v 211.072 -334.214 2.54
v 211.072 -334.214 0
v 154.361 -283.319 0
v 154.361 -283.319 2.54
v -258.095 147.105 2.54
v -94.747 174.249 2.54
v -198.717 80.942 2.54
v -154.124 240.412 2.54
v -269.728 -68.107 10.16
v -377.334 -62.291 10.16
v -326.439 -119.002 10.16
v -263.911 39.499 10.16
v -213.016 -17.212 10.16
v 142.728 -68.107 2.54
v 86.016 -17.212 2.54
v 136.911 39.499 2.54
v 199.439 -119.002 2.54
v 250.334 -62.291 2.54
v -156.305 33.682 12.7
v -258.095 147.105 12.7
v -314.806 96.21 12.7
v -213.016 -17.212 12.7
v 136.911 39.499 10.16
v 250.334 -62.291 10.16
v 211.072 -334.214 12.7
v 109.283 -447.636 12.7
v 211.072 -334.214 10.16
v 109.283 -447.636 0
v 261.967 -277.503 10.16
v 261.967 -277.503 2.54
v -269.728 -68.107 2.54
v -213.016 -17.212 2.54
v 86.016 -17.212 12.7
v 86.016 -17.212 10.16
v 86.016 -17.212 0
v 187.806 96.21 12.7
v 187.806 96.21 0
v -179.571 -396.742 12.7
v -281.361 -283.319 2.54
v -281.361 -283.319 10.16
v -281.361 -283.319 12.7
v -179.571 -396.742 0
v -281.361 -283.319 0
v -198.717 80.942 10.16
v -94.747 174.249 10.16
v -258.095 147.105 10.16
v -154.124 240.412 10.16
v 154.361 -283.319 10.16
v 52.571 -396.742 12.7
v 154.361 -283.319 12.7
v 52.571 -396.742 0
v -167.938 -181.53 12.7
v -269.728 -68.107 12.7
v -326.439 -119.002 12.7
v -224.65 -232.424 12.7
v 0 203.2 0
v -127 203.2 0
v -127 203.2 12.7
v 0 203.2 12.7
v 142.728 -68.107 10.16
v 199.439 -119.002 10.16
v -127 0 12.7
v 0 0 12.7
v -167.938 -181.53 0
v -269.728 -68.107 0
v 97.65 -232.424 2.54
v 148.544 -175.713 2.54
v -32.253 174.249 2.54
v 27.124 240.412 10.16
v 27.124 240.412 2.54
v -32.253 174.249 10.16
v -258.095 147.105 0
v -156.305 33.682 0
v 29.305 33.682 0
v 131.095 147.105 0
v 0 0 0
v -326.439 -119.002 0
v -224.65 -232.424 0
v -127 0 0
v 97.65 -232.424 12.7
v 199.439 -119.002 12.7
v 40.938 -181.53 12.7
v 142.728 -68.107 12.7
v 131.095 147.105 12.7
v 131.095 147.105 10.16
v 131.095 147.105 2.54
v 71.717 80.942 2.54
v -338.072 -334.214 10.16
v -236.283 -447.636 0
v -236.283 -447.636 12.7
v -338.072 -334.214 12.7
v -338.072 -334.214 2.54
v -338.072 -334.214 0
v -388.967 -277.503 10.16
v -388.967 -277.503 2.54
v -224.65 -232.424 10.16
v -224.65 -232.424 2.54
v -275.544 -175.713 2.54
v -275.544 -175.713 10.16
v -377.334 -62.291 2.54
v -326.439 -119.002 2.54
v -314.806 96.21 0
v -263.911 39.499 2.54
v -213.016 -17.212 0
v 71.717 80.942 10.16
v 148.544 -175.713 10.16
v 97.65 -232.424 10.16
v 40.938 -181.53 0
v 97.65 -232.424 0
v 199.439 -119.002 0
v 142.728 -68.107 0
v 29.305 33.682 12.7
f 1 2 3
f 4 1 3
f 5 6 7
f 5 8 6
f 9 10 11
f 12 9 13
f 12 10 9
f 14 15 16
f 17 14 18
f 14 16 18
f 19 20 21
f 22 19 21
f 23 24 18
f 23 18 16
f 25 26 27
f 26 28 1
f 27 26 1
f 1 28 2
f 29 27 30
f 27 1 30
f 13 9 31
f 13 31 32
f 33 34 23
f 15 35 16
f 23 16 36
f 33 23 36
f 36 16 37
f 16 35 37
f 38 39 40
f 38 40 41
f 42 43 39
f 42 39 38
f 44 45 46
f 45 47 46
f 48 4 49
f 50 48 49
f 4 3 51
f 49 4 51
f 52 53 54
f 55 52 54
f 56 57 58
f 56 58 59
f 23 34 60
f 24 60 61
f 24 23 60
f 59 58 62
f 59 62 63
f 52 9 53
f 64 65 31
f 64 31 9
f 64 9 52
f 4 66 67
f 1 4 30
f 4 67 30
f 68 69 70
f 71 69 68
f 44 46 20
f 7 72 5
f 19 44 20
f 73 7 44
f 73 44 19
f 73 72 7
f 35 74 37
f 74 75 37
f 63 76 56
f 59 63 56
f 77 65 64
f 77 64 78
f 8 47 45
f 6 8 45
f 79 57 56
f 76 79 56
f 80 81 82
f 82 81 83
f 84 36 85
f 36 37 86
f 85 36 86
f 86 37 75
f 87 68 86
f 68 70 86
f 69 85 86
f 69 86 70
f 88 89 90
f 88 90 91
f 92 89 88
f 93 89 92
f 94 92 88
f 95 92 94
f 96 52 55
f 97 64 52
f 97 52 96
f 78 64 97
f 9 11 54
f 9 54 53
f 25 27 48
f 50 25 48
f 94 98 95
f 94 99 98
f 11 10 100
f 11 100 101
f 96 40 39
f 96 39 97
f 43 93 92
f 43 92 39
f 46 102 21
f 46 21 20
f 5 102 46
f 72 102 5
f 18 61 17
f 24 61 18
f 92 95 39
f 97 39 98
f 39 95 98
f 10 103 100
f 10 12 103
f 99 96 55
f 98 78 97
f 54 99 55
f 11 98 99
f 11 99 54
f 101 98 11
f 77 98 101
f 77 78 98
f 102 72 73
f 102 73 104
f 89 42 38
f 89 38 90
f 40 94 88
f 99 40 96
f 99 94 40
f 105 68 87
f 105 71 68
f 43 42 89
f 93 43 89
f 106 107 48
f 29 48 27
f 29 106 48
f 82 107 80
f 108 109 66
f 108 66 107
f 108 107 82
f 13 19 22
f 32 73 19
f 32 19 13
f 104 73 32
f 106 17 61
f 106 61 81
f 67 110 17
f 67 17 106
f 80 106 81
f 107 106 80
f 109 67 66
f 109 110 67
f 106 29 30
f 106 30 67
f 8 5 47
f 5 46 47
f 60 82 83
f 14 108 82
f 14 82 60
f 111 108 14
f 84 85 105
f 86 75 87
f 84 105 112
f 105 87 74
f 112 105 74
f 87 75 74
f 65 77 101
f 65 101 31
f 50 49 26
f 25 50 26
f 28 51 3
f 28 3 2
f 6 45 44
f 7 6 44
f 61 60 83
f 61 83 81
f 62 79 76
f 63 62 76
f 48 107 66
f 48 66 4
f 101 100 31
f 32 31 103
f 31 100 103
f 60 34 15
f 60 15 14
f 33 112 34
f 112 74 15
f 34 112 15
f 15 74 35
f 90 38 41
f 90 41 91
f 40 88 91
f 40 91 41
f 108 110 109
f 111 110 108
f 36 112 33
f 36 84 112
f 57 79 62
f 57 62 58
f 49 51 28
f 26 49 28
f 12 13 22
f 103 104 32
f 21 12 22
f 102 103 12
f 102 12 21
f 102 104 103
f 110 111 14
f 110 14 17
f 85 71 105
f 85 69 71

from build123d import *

# Parameters (mm, degrees)
SKETCH1_W                  = 127
SKETCH1_H                  = 203.2
BOSS_EXTRUDE1_DEPTH        = 12.7
BOSS_EXTRUDE2_DEPTH        = 3.81
BOSS_EXTRUDE2_DEPTH_BACK   = 3.81
BOSS_EXTRUDE2_2_DEPTH      = 3.81
BOSS_EXTRUDE2_2_DEPTH_BACK = 3.81
BOSS_EXTRUDE3_START        = -10.16
BOSS_EXTRUDE3_DEPTH        = 12.7
BOSS_EXTRUDE4_DEPTH        = 3.81
BOSS_EXTRUDE4_DEPTH_BACK   = 3.81
BOSS_EXTRUDE5_START        = -10.16
BOSS_EXTRUDE5_DEPTH        = 12.7
BOSS_EXTRUDE6_DEPTH        = 3.81
BOSS_EXTRUDE6_DEPTH_BACK   = 3.81
BOSS_EXTRUDE7_START        = -10.16
BOSS_EXTRUDE7_DEPTH        = 12.7


with BuildPart() as part:
    # Sketch1 → Boss-Extrude1 (new body)
    with BuildSketch(Plane.XY):
        with Locations((-63.5, 101.6)):
            Rectangle(SKETCH1_W, SKETCH1_H)
    extrude(amount=BOSS_EXTRUDE1_DEPTH)


with BuildPart() as body_2:
    # Sketch2 → Boss-Extrude2 (new body, two sides)
    with BuildSketch(Plane.XY.offset(6.35)) as boss_extrude2_sk:
        Polygon((-94.746798064, 174.248710321), (-198.717445096, 80.941719394), (-258.09462114, 147.104858415), (-154.123974108, 240.411849341), align=None)
    extrude(amount=BOSS_EXTRUDE2_DEPTH)
    extrude(boss_extrude2_sk.sketch, amount=-BOSS_EXTRUDE2_DEPTH_BACK)



with BuildPart() as body_3:
    # Sketch2 → Boss-Extrude2 2 (new body, two sides)
    with BuildSketch(Plane.XY.offset(6.35)) as boss_extrude2_2_sk:
        Polygon((-32.253201936, 174.248710321), (71.717445096, 80.941719394), (131.09462114, 147.104858415), (27.123974108, 240.411849341), align=None)
    extrude(amount=BOSS_EXTRUDE2_2_DEPTH)
    extrude(boss_extrude2_2_sk.sketch, amount=-BOSS_EXTRUDE2_2_DEPTH_BACK)


with BuildPart() as body_2_1:
    add(body_2.part)

    add(body_3.part)  # Boss-Extrude3 merges body 3
    # Sketch3 → Boss-Extrude3 (add)
    with BuildSketch(Plane.XY.offset(10.16).offset(BOSS_EXTRUDE3_START)):
        Polygon((-258.09462114, 147.104858415), (-156.305176493, 33.68233438), (-213.01643851, -17.212387944), (-314.805883157, 96.210136091), align=None)
        Polygon((29.305176493, 33.68233438), (86.01643851, -17.212387944), (187.805883157, 96.210136091), (131.09462114, 147.104858415), align=None)
    extrude(amount=BOSS_EXTRUDE3_DEPTH)

    # Sketch4 → Boss-Extrude4 (add, two sides)
    with BuildSketch(Plane.XY.offset(6.35)) as boss_extrude4_sk:
        Polygon((-213.01643851, -17.212387944), (-263.911160834, 39.498874074), (-377.333684869, -62.290570573), (-326.438962545, -119.00183259), align=None)
        Polygon((199.438962545, -119.00183259), (250.333684869, -62.290570573), (136.911160834, 39.498874074), (86.01643851, -17.212387944), align=None)
    extrude(amount=BOSS_EXTRUDE4_DEPTH)
    extrude(boss_extrude4_sk.sketch, amount=-BOSS_EXTRUDE4_DEPTH_BACK)

    # Sketch5 → Boss-Extrude5 (add)
    with BuildSketch(Plane.XY.offset(10.16).offset(BOSS_EXTRUDE5_START)):
        Polygon((-326.438962545, -119.00183259), (-269.727700528, -68.107110267), (-167.938255881, -181.529634302), (-224.649517899, -232.424356626), align=None)
        Polygon((97.649517899, -232.424356626), (40.938255881, -181.529634302), (142.727700528, -68.107110267), (199.438962545, -119.00183259), align=None)
    extrude(amount=BOSS_EXTRUDE5_DEPTH)

    # Sketch6 → Boss-Extrude6 (add, two sides)
    with BuildSketch(Plane.XY.offset(6.35)) as boss_extrude6_sk:
        Polygon((-224.649517899, -232.424356626), (-275.544240222, -175.713094608), (-388.966764257, -277.502539255), (-338.072041934, -334.213801272), align=None)
        Polygon((211.072041934, -334.213801272), (261.966764257, -277.502539255), (148.544240222, -175.713094608), (97.649517899, -232.424356626), align=None)
    extrude(amount=BOSS_EXTRUDE6_DEPTH)
    extrude(boss_extrude6_sk.sketch, amount=-BOSS_EXTRUDE6_DEPTH_BACK)

    # Sketch7 → Boss-Extrude7 (add)
    with BuildSketch(Plane.XY.offset(10.16).offset(BOSS_EXTRUDE7_START)):
        Polygon((-338.072041934, -334.213801272), (-281.360779916, -283.319078949), (-179.571335269, -396.741602984), (-236.282597287, -447.636325307), align=None)
        Polygon((211.072041934, -334.213801272), (154.360779916, -283.319078949), (52.571335269, -396.741602984), (109.282597287, -447.636325307), align=None)
    extrude(amount=BOSS_EXTRUDE7_DEPTH)


solid = Compound([part.part, body_2_1.part])
